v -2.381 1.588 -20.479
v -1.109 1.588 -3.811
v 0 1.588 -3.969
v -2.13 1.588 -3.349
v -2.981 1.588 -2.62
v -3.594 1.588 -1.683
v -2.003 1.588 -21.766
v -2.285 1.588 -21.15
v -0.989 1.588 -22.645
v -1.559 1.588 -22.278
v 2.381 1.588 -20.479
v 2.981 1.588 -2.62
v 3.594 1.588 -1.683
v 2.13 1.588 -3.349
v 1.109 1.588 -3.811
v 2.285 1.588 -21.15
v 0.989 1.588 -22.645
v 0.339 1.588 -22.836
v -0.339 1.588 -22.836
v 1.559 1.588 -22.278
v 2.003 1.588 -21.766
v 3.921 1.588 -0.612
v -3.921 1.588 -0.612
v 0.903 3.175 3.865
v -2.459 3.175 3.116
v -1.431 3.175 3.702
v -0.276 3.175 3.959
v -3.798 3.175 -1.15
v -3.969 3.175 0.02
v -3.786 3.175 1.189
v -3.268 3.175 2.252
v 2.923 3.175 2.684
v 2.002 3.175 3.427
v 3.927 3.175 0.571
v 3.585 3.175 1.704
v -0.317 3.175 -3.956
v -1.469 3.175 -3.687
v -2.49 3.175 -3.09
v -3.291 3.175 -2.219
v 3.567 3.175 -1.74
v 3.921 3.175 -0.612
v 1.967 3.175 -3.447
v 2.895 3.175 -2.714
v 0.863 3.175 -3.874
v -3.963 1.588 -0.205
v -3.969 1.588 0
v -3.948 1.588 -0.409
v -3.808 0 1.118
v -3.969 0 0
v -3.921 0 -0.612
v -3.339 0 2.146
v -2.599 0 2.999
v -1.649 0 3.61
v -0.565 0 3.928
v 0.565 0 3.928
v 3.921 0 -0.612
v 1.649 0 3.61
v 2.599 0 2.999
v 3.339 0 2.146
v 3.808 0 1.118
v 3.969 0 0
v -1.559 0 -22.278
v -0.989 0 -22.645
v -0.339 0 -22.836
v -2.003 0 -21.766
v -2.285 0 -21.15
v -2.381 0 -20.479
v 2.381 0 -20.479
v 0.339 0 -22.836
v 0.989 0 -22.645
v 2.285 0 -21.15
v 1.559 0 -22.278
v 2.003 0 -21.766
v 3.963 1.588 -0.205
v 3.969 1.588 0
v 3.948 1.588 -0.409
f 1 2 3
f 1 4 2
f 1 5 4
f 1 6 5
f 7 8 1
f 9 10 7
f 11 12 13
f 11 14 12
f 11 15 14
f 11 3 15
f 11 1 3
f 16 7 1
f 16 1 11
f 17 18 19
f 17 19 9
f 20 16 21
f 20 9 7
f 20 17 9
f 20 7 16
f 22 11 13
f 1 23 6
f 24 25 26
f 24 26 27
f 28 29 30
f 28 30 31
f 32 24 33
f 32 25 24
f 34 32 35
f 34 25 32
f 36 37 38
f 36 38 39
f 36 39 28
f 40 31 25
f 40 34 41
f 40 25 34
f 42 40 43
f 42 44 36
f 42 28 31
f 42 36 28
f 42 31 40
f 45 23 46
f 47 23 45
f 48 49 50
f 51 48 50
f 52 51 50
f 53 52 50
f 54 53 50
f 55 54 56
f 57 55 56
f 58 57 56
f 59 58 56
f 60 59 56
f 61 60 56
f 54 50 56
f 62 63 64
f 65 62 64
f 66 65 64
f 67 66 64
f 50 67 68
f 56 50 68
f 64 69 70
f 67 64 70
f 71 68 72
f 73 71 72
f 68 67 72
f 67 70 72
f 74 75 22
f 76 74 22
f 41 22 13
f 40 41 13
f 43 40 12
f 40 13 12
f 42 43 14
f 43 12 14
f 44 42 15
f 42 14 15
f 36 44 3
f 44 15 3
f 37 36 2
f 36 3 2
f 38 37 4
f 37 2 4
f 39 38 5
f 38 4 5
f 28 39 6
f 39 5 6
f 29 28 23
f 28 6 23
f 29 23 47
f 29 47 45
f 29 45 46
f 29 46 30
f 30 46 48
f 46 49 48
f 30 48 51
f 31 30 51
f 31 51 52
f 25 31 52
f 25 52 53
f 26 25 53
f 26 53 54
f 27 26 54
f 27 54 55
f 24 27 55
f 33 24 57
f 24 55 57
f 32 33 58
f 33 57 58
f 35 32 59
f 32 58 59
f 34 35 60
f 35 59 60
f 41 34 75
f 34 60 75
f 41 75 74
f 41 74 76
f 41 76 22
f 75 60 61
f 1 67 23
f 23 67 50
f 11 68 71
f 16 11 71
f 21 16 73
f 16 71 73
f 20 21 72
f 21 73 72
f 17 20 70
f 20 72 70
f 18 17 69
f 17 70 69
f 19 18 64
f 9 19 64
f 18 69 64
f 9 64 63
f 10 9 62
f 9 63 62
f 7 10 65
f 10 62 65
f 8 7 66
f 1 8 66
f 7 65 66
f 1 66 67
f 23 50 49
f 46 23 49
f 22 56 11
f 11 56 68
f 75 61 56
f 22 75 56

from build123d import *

# Parameters (mm, degrees)
SKETCH1_R           = 2.38125
BOSS_EXTRUDE1_DEPTH = 1.5875
SKETCH2_R           = 3.96875
BOSS_EXTRUDE2_DEPTH = 1.5875


with BuildPart() as part:
    # Sketch1 → Boss-Extrude1 (new body)
    with BuildSketch(Plane(origin=(0, 0, 0), x_dir=(1, 0, 0), z_dir=(0, 1, 0))):
        with BuildLine():
            Line((3.96875, 0), (3.921336464, 0.61163461))
            ThreePointArc((3.921336464, 0.61163461), (0, 3.96875), (-3.921336464, 0.61163461))
            Line((-3.921336464, 0.61163461), (-3.96875, 0))
            ThreePointArc((-3.96875, 0), (0, -3.96875), (3.96875, 0))
        make_face()
        with BuildLine():
            Line((3.921336464, 0.61163461), (2.38125, 20.47875))
            ThreePointArc((2.38125, 20.47875), (0, 18.0975), (-2.38125, 20.47875))
            Line((-2.38125, 20.47875), (-3.921336464, 0.61163461))
            ThreePointArc((-3.921336464, 0.61163461), (0, 3.96875), (3.921336464, 0.61163461))
        make_face()
        with Locations((0, 20.47875)):
            Circle(SKETCH1_R)
    extrude(amount=BOSS_EXTRUDE1_DEPTH)

    # Sketch2 → Boss-Extrude2 (add)
    with BuildSketch(Plane(origin=(0, 1.5875, 0), x_dir=(1, 0, 0), z_dir=(0, 1, 0))):
        with Locations(Location((0, 0, 0), (0, 0, 8.865336937))):
            Circle(SKETCH2_R)
    extrude(amount=BOSS_EXTRUDE2_DEPTH)


solid = part.part
